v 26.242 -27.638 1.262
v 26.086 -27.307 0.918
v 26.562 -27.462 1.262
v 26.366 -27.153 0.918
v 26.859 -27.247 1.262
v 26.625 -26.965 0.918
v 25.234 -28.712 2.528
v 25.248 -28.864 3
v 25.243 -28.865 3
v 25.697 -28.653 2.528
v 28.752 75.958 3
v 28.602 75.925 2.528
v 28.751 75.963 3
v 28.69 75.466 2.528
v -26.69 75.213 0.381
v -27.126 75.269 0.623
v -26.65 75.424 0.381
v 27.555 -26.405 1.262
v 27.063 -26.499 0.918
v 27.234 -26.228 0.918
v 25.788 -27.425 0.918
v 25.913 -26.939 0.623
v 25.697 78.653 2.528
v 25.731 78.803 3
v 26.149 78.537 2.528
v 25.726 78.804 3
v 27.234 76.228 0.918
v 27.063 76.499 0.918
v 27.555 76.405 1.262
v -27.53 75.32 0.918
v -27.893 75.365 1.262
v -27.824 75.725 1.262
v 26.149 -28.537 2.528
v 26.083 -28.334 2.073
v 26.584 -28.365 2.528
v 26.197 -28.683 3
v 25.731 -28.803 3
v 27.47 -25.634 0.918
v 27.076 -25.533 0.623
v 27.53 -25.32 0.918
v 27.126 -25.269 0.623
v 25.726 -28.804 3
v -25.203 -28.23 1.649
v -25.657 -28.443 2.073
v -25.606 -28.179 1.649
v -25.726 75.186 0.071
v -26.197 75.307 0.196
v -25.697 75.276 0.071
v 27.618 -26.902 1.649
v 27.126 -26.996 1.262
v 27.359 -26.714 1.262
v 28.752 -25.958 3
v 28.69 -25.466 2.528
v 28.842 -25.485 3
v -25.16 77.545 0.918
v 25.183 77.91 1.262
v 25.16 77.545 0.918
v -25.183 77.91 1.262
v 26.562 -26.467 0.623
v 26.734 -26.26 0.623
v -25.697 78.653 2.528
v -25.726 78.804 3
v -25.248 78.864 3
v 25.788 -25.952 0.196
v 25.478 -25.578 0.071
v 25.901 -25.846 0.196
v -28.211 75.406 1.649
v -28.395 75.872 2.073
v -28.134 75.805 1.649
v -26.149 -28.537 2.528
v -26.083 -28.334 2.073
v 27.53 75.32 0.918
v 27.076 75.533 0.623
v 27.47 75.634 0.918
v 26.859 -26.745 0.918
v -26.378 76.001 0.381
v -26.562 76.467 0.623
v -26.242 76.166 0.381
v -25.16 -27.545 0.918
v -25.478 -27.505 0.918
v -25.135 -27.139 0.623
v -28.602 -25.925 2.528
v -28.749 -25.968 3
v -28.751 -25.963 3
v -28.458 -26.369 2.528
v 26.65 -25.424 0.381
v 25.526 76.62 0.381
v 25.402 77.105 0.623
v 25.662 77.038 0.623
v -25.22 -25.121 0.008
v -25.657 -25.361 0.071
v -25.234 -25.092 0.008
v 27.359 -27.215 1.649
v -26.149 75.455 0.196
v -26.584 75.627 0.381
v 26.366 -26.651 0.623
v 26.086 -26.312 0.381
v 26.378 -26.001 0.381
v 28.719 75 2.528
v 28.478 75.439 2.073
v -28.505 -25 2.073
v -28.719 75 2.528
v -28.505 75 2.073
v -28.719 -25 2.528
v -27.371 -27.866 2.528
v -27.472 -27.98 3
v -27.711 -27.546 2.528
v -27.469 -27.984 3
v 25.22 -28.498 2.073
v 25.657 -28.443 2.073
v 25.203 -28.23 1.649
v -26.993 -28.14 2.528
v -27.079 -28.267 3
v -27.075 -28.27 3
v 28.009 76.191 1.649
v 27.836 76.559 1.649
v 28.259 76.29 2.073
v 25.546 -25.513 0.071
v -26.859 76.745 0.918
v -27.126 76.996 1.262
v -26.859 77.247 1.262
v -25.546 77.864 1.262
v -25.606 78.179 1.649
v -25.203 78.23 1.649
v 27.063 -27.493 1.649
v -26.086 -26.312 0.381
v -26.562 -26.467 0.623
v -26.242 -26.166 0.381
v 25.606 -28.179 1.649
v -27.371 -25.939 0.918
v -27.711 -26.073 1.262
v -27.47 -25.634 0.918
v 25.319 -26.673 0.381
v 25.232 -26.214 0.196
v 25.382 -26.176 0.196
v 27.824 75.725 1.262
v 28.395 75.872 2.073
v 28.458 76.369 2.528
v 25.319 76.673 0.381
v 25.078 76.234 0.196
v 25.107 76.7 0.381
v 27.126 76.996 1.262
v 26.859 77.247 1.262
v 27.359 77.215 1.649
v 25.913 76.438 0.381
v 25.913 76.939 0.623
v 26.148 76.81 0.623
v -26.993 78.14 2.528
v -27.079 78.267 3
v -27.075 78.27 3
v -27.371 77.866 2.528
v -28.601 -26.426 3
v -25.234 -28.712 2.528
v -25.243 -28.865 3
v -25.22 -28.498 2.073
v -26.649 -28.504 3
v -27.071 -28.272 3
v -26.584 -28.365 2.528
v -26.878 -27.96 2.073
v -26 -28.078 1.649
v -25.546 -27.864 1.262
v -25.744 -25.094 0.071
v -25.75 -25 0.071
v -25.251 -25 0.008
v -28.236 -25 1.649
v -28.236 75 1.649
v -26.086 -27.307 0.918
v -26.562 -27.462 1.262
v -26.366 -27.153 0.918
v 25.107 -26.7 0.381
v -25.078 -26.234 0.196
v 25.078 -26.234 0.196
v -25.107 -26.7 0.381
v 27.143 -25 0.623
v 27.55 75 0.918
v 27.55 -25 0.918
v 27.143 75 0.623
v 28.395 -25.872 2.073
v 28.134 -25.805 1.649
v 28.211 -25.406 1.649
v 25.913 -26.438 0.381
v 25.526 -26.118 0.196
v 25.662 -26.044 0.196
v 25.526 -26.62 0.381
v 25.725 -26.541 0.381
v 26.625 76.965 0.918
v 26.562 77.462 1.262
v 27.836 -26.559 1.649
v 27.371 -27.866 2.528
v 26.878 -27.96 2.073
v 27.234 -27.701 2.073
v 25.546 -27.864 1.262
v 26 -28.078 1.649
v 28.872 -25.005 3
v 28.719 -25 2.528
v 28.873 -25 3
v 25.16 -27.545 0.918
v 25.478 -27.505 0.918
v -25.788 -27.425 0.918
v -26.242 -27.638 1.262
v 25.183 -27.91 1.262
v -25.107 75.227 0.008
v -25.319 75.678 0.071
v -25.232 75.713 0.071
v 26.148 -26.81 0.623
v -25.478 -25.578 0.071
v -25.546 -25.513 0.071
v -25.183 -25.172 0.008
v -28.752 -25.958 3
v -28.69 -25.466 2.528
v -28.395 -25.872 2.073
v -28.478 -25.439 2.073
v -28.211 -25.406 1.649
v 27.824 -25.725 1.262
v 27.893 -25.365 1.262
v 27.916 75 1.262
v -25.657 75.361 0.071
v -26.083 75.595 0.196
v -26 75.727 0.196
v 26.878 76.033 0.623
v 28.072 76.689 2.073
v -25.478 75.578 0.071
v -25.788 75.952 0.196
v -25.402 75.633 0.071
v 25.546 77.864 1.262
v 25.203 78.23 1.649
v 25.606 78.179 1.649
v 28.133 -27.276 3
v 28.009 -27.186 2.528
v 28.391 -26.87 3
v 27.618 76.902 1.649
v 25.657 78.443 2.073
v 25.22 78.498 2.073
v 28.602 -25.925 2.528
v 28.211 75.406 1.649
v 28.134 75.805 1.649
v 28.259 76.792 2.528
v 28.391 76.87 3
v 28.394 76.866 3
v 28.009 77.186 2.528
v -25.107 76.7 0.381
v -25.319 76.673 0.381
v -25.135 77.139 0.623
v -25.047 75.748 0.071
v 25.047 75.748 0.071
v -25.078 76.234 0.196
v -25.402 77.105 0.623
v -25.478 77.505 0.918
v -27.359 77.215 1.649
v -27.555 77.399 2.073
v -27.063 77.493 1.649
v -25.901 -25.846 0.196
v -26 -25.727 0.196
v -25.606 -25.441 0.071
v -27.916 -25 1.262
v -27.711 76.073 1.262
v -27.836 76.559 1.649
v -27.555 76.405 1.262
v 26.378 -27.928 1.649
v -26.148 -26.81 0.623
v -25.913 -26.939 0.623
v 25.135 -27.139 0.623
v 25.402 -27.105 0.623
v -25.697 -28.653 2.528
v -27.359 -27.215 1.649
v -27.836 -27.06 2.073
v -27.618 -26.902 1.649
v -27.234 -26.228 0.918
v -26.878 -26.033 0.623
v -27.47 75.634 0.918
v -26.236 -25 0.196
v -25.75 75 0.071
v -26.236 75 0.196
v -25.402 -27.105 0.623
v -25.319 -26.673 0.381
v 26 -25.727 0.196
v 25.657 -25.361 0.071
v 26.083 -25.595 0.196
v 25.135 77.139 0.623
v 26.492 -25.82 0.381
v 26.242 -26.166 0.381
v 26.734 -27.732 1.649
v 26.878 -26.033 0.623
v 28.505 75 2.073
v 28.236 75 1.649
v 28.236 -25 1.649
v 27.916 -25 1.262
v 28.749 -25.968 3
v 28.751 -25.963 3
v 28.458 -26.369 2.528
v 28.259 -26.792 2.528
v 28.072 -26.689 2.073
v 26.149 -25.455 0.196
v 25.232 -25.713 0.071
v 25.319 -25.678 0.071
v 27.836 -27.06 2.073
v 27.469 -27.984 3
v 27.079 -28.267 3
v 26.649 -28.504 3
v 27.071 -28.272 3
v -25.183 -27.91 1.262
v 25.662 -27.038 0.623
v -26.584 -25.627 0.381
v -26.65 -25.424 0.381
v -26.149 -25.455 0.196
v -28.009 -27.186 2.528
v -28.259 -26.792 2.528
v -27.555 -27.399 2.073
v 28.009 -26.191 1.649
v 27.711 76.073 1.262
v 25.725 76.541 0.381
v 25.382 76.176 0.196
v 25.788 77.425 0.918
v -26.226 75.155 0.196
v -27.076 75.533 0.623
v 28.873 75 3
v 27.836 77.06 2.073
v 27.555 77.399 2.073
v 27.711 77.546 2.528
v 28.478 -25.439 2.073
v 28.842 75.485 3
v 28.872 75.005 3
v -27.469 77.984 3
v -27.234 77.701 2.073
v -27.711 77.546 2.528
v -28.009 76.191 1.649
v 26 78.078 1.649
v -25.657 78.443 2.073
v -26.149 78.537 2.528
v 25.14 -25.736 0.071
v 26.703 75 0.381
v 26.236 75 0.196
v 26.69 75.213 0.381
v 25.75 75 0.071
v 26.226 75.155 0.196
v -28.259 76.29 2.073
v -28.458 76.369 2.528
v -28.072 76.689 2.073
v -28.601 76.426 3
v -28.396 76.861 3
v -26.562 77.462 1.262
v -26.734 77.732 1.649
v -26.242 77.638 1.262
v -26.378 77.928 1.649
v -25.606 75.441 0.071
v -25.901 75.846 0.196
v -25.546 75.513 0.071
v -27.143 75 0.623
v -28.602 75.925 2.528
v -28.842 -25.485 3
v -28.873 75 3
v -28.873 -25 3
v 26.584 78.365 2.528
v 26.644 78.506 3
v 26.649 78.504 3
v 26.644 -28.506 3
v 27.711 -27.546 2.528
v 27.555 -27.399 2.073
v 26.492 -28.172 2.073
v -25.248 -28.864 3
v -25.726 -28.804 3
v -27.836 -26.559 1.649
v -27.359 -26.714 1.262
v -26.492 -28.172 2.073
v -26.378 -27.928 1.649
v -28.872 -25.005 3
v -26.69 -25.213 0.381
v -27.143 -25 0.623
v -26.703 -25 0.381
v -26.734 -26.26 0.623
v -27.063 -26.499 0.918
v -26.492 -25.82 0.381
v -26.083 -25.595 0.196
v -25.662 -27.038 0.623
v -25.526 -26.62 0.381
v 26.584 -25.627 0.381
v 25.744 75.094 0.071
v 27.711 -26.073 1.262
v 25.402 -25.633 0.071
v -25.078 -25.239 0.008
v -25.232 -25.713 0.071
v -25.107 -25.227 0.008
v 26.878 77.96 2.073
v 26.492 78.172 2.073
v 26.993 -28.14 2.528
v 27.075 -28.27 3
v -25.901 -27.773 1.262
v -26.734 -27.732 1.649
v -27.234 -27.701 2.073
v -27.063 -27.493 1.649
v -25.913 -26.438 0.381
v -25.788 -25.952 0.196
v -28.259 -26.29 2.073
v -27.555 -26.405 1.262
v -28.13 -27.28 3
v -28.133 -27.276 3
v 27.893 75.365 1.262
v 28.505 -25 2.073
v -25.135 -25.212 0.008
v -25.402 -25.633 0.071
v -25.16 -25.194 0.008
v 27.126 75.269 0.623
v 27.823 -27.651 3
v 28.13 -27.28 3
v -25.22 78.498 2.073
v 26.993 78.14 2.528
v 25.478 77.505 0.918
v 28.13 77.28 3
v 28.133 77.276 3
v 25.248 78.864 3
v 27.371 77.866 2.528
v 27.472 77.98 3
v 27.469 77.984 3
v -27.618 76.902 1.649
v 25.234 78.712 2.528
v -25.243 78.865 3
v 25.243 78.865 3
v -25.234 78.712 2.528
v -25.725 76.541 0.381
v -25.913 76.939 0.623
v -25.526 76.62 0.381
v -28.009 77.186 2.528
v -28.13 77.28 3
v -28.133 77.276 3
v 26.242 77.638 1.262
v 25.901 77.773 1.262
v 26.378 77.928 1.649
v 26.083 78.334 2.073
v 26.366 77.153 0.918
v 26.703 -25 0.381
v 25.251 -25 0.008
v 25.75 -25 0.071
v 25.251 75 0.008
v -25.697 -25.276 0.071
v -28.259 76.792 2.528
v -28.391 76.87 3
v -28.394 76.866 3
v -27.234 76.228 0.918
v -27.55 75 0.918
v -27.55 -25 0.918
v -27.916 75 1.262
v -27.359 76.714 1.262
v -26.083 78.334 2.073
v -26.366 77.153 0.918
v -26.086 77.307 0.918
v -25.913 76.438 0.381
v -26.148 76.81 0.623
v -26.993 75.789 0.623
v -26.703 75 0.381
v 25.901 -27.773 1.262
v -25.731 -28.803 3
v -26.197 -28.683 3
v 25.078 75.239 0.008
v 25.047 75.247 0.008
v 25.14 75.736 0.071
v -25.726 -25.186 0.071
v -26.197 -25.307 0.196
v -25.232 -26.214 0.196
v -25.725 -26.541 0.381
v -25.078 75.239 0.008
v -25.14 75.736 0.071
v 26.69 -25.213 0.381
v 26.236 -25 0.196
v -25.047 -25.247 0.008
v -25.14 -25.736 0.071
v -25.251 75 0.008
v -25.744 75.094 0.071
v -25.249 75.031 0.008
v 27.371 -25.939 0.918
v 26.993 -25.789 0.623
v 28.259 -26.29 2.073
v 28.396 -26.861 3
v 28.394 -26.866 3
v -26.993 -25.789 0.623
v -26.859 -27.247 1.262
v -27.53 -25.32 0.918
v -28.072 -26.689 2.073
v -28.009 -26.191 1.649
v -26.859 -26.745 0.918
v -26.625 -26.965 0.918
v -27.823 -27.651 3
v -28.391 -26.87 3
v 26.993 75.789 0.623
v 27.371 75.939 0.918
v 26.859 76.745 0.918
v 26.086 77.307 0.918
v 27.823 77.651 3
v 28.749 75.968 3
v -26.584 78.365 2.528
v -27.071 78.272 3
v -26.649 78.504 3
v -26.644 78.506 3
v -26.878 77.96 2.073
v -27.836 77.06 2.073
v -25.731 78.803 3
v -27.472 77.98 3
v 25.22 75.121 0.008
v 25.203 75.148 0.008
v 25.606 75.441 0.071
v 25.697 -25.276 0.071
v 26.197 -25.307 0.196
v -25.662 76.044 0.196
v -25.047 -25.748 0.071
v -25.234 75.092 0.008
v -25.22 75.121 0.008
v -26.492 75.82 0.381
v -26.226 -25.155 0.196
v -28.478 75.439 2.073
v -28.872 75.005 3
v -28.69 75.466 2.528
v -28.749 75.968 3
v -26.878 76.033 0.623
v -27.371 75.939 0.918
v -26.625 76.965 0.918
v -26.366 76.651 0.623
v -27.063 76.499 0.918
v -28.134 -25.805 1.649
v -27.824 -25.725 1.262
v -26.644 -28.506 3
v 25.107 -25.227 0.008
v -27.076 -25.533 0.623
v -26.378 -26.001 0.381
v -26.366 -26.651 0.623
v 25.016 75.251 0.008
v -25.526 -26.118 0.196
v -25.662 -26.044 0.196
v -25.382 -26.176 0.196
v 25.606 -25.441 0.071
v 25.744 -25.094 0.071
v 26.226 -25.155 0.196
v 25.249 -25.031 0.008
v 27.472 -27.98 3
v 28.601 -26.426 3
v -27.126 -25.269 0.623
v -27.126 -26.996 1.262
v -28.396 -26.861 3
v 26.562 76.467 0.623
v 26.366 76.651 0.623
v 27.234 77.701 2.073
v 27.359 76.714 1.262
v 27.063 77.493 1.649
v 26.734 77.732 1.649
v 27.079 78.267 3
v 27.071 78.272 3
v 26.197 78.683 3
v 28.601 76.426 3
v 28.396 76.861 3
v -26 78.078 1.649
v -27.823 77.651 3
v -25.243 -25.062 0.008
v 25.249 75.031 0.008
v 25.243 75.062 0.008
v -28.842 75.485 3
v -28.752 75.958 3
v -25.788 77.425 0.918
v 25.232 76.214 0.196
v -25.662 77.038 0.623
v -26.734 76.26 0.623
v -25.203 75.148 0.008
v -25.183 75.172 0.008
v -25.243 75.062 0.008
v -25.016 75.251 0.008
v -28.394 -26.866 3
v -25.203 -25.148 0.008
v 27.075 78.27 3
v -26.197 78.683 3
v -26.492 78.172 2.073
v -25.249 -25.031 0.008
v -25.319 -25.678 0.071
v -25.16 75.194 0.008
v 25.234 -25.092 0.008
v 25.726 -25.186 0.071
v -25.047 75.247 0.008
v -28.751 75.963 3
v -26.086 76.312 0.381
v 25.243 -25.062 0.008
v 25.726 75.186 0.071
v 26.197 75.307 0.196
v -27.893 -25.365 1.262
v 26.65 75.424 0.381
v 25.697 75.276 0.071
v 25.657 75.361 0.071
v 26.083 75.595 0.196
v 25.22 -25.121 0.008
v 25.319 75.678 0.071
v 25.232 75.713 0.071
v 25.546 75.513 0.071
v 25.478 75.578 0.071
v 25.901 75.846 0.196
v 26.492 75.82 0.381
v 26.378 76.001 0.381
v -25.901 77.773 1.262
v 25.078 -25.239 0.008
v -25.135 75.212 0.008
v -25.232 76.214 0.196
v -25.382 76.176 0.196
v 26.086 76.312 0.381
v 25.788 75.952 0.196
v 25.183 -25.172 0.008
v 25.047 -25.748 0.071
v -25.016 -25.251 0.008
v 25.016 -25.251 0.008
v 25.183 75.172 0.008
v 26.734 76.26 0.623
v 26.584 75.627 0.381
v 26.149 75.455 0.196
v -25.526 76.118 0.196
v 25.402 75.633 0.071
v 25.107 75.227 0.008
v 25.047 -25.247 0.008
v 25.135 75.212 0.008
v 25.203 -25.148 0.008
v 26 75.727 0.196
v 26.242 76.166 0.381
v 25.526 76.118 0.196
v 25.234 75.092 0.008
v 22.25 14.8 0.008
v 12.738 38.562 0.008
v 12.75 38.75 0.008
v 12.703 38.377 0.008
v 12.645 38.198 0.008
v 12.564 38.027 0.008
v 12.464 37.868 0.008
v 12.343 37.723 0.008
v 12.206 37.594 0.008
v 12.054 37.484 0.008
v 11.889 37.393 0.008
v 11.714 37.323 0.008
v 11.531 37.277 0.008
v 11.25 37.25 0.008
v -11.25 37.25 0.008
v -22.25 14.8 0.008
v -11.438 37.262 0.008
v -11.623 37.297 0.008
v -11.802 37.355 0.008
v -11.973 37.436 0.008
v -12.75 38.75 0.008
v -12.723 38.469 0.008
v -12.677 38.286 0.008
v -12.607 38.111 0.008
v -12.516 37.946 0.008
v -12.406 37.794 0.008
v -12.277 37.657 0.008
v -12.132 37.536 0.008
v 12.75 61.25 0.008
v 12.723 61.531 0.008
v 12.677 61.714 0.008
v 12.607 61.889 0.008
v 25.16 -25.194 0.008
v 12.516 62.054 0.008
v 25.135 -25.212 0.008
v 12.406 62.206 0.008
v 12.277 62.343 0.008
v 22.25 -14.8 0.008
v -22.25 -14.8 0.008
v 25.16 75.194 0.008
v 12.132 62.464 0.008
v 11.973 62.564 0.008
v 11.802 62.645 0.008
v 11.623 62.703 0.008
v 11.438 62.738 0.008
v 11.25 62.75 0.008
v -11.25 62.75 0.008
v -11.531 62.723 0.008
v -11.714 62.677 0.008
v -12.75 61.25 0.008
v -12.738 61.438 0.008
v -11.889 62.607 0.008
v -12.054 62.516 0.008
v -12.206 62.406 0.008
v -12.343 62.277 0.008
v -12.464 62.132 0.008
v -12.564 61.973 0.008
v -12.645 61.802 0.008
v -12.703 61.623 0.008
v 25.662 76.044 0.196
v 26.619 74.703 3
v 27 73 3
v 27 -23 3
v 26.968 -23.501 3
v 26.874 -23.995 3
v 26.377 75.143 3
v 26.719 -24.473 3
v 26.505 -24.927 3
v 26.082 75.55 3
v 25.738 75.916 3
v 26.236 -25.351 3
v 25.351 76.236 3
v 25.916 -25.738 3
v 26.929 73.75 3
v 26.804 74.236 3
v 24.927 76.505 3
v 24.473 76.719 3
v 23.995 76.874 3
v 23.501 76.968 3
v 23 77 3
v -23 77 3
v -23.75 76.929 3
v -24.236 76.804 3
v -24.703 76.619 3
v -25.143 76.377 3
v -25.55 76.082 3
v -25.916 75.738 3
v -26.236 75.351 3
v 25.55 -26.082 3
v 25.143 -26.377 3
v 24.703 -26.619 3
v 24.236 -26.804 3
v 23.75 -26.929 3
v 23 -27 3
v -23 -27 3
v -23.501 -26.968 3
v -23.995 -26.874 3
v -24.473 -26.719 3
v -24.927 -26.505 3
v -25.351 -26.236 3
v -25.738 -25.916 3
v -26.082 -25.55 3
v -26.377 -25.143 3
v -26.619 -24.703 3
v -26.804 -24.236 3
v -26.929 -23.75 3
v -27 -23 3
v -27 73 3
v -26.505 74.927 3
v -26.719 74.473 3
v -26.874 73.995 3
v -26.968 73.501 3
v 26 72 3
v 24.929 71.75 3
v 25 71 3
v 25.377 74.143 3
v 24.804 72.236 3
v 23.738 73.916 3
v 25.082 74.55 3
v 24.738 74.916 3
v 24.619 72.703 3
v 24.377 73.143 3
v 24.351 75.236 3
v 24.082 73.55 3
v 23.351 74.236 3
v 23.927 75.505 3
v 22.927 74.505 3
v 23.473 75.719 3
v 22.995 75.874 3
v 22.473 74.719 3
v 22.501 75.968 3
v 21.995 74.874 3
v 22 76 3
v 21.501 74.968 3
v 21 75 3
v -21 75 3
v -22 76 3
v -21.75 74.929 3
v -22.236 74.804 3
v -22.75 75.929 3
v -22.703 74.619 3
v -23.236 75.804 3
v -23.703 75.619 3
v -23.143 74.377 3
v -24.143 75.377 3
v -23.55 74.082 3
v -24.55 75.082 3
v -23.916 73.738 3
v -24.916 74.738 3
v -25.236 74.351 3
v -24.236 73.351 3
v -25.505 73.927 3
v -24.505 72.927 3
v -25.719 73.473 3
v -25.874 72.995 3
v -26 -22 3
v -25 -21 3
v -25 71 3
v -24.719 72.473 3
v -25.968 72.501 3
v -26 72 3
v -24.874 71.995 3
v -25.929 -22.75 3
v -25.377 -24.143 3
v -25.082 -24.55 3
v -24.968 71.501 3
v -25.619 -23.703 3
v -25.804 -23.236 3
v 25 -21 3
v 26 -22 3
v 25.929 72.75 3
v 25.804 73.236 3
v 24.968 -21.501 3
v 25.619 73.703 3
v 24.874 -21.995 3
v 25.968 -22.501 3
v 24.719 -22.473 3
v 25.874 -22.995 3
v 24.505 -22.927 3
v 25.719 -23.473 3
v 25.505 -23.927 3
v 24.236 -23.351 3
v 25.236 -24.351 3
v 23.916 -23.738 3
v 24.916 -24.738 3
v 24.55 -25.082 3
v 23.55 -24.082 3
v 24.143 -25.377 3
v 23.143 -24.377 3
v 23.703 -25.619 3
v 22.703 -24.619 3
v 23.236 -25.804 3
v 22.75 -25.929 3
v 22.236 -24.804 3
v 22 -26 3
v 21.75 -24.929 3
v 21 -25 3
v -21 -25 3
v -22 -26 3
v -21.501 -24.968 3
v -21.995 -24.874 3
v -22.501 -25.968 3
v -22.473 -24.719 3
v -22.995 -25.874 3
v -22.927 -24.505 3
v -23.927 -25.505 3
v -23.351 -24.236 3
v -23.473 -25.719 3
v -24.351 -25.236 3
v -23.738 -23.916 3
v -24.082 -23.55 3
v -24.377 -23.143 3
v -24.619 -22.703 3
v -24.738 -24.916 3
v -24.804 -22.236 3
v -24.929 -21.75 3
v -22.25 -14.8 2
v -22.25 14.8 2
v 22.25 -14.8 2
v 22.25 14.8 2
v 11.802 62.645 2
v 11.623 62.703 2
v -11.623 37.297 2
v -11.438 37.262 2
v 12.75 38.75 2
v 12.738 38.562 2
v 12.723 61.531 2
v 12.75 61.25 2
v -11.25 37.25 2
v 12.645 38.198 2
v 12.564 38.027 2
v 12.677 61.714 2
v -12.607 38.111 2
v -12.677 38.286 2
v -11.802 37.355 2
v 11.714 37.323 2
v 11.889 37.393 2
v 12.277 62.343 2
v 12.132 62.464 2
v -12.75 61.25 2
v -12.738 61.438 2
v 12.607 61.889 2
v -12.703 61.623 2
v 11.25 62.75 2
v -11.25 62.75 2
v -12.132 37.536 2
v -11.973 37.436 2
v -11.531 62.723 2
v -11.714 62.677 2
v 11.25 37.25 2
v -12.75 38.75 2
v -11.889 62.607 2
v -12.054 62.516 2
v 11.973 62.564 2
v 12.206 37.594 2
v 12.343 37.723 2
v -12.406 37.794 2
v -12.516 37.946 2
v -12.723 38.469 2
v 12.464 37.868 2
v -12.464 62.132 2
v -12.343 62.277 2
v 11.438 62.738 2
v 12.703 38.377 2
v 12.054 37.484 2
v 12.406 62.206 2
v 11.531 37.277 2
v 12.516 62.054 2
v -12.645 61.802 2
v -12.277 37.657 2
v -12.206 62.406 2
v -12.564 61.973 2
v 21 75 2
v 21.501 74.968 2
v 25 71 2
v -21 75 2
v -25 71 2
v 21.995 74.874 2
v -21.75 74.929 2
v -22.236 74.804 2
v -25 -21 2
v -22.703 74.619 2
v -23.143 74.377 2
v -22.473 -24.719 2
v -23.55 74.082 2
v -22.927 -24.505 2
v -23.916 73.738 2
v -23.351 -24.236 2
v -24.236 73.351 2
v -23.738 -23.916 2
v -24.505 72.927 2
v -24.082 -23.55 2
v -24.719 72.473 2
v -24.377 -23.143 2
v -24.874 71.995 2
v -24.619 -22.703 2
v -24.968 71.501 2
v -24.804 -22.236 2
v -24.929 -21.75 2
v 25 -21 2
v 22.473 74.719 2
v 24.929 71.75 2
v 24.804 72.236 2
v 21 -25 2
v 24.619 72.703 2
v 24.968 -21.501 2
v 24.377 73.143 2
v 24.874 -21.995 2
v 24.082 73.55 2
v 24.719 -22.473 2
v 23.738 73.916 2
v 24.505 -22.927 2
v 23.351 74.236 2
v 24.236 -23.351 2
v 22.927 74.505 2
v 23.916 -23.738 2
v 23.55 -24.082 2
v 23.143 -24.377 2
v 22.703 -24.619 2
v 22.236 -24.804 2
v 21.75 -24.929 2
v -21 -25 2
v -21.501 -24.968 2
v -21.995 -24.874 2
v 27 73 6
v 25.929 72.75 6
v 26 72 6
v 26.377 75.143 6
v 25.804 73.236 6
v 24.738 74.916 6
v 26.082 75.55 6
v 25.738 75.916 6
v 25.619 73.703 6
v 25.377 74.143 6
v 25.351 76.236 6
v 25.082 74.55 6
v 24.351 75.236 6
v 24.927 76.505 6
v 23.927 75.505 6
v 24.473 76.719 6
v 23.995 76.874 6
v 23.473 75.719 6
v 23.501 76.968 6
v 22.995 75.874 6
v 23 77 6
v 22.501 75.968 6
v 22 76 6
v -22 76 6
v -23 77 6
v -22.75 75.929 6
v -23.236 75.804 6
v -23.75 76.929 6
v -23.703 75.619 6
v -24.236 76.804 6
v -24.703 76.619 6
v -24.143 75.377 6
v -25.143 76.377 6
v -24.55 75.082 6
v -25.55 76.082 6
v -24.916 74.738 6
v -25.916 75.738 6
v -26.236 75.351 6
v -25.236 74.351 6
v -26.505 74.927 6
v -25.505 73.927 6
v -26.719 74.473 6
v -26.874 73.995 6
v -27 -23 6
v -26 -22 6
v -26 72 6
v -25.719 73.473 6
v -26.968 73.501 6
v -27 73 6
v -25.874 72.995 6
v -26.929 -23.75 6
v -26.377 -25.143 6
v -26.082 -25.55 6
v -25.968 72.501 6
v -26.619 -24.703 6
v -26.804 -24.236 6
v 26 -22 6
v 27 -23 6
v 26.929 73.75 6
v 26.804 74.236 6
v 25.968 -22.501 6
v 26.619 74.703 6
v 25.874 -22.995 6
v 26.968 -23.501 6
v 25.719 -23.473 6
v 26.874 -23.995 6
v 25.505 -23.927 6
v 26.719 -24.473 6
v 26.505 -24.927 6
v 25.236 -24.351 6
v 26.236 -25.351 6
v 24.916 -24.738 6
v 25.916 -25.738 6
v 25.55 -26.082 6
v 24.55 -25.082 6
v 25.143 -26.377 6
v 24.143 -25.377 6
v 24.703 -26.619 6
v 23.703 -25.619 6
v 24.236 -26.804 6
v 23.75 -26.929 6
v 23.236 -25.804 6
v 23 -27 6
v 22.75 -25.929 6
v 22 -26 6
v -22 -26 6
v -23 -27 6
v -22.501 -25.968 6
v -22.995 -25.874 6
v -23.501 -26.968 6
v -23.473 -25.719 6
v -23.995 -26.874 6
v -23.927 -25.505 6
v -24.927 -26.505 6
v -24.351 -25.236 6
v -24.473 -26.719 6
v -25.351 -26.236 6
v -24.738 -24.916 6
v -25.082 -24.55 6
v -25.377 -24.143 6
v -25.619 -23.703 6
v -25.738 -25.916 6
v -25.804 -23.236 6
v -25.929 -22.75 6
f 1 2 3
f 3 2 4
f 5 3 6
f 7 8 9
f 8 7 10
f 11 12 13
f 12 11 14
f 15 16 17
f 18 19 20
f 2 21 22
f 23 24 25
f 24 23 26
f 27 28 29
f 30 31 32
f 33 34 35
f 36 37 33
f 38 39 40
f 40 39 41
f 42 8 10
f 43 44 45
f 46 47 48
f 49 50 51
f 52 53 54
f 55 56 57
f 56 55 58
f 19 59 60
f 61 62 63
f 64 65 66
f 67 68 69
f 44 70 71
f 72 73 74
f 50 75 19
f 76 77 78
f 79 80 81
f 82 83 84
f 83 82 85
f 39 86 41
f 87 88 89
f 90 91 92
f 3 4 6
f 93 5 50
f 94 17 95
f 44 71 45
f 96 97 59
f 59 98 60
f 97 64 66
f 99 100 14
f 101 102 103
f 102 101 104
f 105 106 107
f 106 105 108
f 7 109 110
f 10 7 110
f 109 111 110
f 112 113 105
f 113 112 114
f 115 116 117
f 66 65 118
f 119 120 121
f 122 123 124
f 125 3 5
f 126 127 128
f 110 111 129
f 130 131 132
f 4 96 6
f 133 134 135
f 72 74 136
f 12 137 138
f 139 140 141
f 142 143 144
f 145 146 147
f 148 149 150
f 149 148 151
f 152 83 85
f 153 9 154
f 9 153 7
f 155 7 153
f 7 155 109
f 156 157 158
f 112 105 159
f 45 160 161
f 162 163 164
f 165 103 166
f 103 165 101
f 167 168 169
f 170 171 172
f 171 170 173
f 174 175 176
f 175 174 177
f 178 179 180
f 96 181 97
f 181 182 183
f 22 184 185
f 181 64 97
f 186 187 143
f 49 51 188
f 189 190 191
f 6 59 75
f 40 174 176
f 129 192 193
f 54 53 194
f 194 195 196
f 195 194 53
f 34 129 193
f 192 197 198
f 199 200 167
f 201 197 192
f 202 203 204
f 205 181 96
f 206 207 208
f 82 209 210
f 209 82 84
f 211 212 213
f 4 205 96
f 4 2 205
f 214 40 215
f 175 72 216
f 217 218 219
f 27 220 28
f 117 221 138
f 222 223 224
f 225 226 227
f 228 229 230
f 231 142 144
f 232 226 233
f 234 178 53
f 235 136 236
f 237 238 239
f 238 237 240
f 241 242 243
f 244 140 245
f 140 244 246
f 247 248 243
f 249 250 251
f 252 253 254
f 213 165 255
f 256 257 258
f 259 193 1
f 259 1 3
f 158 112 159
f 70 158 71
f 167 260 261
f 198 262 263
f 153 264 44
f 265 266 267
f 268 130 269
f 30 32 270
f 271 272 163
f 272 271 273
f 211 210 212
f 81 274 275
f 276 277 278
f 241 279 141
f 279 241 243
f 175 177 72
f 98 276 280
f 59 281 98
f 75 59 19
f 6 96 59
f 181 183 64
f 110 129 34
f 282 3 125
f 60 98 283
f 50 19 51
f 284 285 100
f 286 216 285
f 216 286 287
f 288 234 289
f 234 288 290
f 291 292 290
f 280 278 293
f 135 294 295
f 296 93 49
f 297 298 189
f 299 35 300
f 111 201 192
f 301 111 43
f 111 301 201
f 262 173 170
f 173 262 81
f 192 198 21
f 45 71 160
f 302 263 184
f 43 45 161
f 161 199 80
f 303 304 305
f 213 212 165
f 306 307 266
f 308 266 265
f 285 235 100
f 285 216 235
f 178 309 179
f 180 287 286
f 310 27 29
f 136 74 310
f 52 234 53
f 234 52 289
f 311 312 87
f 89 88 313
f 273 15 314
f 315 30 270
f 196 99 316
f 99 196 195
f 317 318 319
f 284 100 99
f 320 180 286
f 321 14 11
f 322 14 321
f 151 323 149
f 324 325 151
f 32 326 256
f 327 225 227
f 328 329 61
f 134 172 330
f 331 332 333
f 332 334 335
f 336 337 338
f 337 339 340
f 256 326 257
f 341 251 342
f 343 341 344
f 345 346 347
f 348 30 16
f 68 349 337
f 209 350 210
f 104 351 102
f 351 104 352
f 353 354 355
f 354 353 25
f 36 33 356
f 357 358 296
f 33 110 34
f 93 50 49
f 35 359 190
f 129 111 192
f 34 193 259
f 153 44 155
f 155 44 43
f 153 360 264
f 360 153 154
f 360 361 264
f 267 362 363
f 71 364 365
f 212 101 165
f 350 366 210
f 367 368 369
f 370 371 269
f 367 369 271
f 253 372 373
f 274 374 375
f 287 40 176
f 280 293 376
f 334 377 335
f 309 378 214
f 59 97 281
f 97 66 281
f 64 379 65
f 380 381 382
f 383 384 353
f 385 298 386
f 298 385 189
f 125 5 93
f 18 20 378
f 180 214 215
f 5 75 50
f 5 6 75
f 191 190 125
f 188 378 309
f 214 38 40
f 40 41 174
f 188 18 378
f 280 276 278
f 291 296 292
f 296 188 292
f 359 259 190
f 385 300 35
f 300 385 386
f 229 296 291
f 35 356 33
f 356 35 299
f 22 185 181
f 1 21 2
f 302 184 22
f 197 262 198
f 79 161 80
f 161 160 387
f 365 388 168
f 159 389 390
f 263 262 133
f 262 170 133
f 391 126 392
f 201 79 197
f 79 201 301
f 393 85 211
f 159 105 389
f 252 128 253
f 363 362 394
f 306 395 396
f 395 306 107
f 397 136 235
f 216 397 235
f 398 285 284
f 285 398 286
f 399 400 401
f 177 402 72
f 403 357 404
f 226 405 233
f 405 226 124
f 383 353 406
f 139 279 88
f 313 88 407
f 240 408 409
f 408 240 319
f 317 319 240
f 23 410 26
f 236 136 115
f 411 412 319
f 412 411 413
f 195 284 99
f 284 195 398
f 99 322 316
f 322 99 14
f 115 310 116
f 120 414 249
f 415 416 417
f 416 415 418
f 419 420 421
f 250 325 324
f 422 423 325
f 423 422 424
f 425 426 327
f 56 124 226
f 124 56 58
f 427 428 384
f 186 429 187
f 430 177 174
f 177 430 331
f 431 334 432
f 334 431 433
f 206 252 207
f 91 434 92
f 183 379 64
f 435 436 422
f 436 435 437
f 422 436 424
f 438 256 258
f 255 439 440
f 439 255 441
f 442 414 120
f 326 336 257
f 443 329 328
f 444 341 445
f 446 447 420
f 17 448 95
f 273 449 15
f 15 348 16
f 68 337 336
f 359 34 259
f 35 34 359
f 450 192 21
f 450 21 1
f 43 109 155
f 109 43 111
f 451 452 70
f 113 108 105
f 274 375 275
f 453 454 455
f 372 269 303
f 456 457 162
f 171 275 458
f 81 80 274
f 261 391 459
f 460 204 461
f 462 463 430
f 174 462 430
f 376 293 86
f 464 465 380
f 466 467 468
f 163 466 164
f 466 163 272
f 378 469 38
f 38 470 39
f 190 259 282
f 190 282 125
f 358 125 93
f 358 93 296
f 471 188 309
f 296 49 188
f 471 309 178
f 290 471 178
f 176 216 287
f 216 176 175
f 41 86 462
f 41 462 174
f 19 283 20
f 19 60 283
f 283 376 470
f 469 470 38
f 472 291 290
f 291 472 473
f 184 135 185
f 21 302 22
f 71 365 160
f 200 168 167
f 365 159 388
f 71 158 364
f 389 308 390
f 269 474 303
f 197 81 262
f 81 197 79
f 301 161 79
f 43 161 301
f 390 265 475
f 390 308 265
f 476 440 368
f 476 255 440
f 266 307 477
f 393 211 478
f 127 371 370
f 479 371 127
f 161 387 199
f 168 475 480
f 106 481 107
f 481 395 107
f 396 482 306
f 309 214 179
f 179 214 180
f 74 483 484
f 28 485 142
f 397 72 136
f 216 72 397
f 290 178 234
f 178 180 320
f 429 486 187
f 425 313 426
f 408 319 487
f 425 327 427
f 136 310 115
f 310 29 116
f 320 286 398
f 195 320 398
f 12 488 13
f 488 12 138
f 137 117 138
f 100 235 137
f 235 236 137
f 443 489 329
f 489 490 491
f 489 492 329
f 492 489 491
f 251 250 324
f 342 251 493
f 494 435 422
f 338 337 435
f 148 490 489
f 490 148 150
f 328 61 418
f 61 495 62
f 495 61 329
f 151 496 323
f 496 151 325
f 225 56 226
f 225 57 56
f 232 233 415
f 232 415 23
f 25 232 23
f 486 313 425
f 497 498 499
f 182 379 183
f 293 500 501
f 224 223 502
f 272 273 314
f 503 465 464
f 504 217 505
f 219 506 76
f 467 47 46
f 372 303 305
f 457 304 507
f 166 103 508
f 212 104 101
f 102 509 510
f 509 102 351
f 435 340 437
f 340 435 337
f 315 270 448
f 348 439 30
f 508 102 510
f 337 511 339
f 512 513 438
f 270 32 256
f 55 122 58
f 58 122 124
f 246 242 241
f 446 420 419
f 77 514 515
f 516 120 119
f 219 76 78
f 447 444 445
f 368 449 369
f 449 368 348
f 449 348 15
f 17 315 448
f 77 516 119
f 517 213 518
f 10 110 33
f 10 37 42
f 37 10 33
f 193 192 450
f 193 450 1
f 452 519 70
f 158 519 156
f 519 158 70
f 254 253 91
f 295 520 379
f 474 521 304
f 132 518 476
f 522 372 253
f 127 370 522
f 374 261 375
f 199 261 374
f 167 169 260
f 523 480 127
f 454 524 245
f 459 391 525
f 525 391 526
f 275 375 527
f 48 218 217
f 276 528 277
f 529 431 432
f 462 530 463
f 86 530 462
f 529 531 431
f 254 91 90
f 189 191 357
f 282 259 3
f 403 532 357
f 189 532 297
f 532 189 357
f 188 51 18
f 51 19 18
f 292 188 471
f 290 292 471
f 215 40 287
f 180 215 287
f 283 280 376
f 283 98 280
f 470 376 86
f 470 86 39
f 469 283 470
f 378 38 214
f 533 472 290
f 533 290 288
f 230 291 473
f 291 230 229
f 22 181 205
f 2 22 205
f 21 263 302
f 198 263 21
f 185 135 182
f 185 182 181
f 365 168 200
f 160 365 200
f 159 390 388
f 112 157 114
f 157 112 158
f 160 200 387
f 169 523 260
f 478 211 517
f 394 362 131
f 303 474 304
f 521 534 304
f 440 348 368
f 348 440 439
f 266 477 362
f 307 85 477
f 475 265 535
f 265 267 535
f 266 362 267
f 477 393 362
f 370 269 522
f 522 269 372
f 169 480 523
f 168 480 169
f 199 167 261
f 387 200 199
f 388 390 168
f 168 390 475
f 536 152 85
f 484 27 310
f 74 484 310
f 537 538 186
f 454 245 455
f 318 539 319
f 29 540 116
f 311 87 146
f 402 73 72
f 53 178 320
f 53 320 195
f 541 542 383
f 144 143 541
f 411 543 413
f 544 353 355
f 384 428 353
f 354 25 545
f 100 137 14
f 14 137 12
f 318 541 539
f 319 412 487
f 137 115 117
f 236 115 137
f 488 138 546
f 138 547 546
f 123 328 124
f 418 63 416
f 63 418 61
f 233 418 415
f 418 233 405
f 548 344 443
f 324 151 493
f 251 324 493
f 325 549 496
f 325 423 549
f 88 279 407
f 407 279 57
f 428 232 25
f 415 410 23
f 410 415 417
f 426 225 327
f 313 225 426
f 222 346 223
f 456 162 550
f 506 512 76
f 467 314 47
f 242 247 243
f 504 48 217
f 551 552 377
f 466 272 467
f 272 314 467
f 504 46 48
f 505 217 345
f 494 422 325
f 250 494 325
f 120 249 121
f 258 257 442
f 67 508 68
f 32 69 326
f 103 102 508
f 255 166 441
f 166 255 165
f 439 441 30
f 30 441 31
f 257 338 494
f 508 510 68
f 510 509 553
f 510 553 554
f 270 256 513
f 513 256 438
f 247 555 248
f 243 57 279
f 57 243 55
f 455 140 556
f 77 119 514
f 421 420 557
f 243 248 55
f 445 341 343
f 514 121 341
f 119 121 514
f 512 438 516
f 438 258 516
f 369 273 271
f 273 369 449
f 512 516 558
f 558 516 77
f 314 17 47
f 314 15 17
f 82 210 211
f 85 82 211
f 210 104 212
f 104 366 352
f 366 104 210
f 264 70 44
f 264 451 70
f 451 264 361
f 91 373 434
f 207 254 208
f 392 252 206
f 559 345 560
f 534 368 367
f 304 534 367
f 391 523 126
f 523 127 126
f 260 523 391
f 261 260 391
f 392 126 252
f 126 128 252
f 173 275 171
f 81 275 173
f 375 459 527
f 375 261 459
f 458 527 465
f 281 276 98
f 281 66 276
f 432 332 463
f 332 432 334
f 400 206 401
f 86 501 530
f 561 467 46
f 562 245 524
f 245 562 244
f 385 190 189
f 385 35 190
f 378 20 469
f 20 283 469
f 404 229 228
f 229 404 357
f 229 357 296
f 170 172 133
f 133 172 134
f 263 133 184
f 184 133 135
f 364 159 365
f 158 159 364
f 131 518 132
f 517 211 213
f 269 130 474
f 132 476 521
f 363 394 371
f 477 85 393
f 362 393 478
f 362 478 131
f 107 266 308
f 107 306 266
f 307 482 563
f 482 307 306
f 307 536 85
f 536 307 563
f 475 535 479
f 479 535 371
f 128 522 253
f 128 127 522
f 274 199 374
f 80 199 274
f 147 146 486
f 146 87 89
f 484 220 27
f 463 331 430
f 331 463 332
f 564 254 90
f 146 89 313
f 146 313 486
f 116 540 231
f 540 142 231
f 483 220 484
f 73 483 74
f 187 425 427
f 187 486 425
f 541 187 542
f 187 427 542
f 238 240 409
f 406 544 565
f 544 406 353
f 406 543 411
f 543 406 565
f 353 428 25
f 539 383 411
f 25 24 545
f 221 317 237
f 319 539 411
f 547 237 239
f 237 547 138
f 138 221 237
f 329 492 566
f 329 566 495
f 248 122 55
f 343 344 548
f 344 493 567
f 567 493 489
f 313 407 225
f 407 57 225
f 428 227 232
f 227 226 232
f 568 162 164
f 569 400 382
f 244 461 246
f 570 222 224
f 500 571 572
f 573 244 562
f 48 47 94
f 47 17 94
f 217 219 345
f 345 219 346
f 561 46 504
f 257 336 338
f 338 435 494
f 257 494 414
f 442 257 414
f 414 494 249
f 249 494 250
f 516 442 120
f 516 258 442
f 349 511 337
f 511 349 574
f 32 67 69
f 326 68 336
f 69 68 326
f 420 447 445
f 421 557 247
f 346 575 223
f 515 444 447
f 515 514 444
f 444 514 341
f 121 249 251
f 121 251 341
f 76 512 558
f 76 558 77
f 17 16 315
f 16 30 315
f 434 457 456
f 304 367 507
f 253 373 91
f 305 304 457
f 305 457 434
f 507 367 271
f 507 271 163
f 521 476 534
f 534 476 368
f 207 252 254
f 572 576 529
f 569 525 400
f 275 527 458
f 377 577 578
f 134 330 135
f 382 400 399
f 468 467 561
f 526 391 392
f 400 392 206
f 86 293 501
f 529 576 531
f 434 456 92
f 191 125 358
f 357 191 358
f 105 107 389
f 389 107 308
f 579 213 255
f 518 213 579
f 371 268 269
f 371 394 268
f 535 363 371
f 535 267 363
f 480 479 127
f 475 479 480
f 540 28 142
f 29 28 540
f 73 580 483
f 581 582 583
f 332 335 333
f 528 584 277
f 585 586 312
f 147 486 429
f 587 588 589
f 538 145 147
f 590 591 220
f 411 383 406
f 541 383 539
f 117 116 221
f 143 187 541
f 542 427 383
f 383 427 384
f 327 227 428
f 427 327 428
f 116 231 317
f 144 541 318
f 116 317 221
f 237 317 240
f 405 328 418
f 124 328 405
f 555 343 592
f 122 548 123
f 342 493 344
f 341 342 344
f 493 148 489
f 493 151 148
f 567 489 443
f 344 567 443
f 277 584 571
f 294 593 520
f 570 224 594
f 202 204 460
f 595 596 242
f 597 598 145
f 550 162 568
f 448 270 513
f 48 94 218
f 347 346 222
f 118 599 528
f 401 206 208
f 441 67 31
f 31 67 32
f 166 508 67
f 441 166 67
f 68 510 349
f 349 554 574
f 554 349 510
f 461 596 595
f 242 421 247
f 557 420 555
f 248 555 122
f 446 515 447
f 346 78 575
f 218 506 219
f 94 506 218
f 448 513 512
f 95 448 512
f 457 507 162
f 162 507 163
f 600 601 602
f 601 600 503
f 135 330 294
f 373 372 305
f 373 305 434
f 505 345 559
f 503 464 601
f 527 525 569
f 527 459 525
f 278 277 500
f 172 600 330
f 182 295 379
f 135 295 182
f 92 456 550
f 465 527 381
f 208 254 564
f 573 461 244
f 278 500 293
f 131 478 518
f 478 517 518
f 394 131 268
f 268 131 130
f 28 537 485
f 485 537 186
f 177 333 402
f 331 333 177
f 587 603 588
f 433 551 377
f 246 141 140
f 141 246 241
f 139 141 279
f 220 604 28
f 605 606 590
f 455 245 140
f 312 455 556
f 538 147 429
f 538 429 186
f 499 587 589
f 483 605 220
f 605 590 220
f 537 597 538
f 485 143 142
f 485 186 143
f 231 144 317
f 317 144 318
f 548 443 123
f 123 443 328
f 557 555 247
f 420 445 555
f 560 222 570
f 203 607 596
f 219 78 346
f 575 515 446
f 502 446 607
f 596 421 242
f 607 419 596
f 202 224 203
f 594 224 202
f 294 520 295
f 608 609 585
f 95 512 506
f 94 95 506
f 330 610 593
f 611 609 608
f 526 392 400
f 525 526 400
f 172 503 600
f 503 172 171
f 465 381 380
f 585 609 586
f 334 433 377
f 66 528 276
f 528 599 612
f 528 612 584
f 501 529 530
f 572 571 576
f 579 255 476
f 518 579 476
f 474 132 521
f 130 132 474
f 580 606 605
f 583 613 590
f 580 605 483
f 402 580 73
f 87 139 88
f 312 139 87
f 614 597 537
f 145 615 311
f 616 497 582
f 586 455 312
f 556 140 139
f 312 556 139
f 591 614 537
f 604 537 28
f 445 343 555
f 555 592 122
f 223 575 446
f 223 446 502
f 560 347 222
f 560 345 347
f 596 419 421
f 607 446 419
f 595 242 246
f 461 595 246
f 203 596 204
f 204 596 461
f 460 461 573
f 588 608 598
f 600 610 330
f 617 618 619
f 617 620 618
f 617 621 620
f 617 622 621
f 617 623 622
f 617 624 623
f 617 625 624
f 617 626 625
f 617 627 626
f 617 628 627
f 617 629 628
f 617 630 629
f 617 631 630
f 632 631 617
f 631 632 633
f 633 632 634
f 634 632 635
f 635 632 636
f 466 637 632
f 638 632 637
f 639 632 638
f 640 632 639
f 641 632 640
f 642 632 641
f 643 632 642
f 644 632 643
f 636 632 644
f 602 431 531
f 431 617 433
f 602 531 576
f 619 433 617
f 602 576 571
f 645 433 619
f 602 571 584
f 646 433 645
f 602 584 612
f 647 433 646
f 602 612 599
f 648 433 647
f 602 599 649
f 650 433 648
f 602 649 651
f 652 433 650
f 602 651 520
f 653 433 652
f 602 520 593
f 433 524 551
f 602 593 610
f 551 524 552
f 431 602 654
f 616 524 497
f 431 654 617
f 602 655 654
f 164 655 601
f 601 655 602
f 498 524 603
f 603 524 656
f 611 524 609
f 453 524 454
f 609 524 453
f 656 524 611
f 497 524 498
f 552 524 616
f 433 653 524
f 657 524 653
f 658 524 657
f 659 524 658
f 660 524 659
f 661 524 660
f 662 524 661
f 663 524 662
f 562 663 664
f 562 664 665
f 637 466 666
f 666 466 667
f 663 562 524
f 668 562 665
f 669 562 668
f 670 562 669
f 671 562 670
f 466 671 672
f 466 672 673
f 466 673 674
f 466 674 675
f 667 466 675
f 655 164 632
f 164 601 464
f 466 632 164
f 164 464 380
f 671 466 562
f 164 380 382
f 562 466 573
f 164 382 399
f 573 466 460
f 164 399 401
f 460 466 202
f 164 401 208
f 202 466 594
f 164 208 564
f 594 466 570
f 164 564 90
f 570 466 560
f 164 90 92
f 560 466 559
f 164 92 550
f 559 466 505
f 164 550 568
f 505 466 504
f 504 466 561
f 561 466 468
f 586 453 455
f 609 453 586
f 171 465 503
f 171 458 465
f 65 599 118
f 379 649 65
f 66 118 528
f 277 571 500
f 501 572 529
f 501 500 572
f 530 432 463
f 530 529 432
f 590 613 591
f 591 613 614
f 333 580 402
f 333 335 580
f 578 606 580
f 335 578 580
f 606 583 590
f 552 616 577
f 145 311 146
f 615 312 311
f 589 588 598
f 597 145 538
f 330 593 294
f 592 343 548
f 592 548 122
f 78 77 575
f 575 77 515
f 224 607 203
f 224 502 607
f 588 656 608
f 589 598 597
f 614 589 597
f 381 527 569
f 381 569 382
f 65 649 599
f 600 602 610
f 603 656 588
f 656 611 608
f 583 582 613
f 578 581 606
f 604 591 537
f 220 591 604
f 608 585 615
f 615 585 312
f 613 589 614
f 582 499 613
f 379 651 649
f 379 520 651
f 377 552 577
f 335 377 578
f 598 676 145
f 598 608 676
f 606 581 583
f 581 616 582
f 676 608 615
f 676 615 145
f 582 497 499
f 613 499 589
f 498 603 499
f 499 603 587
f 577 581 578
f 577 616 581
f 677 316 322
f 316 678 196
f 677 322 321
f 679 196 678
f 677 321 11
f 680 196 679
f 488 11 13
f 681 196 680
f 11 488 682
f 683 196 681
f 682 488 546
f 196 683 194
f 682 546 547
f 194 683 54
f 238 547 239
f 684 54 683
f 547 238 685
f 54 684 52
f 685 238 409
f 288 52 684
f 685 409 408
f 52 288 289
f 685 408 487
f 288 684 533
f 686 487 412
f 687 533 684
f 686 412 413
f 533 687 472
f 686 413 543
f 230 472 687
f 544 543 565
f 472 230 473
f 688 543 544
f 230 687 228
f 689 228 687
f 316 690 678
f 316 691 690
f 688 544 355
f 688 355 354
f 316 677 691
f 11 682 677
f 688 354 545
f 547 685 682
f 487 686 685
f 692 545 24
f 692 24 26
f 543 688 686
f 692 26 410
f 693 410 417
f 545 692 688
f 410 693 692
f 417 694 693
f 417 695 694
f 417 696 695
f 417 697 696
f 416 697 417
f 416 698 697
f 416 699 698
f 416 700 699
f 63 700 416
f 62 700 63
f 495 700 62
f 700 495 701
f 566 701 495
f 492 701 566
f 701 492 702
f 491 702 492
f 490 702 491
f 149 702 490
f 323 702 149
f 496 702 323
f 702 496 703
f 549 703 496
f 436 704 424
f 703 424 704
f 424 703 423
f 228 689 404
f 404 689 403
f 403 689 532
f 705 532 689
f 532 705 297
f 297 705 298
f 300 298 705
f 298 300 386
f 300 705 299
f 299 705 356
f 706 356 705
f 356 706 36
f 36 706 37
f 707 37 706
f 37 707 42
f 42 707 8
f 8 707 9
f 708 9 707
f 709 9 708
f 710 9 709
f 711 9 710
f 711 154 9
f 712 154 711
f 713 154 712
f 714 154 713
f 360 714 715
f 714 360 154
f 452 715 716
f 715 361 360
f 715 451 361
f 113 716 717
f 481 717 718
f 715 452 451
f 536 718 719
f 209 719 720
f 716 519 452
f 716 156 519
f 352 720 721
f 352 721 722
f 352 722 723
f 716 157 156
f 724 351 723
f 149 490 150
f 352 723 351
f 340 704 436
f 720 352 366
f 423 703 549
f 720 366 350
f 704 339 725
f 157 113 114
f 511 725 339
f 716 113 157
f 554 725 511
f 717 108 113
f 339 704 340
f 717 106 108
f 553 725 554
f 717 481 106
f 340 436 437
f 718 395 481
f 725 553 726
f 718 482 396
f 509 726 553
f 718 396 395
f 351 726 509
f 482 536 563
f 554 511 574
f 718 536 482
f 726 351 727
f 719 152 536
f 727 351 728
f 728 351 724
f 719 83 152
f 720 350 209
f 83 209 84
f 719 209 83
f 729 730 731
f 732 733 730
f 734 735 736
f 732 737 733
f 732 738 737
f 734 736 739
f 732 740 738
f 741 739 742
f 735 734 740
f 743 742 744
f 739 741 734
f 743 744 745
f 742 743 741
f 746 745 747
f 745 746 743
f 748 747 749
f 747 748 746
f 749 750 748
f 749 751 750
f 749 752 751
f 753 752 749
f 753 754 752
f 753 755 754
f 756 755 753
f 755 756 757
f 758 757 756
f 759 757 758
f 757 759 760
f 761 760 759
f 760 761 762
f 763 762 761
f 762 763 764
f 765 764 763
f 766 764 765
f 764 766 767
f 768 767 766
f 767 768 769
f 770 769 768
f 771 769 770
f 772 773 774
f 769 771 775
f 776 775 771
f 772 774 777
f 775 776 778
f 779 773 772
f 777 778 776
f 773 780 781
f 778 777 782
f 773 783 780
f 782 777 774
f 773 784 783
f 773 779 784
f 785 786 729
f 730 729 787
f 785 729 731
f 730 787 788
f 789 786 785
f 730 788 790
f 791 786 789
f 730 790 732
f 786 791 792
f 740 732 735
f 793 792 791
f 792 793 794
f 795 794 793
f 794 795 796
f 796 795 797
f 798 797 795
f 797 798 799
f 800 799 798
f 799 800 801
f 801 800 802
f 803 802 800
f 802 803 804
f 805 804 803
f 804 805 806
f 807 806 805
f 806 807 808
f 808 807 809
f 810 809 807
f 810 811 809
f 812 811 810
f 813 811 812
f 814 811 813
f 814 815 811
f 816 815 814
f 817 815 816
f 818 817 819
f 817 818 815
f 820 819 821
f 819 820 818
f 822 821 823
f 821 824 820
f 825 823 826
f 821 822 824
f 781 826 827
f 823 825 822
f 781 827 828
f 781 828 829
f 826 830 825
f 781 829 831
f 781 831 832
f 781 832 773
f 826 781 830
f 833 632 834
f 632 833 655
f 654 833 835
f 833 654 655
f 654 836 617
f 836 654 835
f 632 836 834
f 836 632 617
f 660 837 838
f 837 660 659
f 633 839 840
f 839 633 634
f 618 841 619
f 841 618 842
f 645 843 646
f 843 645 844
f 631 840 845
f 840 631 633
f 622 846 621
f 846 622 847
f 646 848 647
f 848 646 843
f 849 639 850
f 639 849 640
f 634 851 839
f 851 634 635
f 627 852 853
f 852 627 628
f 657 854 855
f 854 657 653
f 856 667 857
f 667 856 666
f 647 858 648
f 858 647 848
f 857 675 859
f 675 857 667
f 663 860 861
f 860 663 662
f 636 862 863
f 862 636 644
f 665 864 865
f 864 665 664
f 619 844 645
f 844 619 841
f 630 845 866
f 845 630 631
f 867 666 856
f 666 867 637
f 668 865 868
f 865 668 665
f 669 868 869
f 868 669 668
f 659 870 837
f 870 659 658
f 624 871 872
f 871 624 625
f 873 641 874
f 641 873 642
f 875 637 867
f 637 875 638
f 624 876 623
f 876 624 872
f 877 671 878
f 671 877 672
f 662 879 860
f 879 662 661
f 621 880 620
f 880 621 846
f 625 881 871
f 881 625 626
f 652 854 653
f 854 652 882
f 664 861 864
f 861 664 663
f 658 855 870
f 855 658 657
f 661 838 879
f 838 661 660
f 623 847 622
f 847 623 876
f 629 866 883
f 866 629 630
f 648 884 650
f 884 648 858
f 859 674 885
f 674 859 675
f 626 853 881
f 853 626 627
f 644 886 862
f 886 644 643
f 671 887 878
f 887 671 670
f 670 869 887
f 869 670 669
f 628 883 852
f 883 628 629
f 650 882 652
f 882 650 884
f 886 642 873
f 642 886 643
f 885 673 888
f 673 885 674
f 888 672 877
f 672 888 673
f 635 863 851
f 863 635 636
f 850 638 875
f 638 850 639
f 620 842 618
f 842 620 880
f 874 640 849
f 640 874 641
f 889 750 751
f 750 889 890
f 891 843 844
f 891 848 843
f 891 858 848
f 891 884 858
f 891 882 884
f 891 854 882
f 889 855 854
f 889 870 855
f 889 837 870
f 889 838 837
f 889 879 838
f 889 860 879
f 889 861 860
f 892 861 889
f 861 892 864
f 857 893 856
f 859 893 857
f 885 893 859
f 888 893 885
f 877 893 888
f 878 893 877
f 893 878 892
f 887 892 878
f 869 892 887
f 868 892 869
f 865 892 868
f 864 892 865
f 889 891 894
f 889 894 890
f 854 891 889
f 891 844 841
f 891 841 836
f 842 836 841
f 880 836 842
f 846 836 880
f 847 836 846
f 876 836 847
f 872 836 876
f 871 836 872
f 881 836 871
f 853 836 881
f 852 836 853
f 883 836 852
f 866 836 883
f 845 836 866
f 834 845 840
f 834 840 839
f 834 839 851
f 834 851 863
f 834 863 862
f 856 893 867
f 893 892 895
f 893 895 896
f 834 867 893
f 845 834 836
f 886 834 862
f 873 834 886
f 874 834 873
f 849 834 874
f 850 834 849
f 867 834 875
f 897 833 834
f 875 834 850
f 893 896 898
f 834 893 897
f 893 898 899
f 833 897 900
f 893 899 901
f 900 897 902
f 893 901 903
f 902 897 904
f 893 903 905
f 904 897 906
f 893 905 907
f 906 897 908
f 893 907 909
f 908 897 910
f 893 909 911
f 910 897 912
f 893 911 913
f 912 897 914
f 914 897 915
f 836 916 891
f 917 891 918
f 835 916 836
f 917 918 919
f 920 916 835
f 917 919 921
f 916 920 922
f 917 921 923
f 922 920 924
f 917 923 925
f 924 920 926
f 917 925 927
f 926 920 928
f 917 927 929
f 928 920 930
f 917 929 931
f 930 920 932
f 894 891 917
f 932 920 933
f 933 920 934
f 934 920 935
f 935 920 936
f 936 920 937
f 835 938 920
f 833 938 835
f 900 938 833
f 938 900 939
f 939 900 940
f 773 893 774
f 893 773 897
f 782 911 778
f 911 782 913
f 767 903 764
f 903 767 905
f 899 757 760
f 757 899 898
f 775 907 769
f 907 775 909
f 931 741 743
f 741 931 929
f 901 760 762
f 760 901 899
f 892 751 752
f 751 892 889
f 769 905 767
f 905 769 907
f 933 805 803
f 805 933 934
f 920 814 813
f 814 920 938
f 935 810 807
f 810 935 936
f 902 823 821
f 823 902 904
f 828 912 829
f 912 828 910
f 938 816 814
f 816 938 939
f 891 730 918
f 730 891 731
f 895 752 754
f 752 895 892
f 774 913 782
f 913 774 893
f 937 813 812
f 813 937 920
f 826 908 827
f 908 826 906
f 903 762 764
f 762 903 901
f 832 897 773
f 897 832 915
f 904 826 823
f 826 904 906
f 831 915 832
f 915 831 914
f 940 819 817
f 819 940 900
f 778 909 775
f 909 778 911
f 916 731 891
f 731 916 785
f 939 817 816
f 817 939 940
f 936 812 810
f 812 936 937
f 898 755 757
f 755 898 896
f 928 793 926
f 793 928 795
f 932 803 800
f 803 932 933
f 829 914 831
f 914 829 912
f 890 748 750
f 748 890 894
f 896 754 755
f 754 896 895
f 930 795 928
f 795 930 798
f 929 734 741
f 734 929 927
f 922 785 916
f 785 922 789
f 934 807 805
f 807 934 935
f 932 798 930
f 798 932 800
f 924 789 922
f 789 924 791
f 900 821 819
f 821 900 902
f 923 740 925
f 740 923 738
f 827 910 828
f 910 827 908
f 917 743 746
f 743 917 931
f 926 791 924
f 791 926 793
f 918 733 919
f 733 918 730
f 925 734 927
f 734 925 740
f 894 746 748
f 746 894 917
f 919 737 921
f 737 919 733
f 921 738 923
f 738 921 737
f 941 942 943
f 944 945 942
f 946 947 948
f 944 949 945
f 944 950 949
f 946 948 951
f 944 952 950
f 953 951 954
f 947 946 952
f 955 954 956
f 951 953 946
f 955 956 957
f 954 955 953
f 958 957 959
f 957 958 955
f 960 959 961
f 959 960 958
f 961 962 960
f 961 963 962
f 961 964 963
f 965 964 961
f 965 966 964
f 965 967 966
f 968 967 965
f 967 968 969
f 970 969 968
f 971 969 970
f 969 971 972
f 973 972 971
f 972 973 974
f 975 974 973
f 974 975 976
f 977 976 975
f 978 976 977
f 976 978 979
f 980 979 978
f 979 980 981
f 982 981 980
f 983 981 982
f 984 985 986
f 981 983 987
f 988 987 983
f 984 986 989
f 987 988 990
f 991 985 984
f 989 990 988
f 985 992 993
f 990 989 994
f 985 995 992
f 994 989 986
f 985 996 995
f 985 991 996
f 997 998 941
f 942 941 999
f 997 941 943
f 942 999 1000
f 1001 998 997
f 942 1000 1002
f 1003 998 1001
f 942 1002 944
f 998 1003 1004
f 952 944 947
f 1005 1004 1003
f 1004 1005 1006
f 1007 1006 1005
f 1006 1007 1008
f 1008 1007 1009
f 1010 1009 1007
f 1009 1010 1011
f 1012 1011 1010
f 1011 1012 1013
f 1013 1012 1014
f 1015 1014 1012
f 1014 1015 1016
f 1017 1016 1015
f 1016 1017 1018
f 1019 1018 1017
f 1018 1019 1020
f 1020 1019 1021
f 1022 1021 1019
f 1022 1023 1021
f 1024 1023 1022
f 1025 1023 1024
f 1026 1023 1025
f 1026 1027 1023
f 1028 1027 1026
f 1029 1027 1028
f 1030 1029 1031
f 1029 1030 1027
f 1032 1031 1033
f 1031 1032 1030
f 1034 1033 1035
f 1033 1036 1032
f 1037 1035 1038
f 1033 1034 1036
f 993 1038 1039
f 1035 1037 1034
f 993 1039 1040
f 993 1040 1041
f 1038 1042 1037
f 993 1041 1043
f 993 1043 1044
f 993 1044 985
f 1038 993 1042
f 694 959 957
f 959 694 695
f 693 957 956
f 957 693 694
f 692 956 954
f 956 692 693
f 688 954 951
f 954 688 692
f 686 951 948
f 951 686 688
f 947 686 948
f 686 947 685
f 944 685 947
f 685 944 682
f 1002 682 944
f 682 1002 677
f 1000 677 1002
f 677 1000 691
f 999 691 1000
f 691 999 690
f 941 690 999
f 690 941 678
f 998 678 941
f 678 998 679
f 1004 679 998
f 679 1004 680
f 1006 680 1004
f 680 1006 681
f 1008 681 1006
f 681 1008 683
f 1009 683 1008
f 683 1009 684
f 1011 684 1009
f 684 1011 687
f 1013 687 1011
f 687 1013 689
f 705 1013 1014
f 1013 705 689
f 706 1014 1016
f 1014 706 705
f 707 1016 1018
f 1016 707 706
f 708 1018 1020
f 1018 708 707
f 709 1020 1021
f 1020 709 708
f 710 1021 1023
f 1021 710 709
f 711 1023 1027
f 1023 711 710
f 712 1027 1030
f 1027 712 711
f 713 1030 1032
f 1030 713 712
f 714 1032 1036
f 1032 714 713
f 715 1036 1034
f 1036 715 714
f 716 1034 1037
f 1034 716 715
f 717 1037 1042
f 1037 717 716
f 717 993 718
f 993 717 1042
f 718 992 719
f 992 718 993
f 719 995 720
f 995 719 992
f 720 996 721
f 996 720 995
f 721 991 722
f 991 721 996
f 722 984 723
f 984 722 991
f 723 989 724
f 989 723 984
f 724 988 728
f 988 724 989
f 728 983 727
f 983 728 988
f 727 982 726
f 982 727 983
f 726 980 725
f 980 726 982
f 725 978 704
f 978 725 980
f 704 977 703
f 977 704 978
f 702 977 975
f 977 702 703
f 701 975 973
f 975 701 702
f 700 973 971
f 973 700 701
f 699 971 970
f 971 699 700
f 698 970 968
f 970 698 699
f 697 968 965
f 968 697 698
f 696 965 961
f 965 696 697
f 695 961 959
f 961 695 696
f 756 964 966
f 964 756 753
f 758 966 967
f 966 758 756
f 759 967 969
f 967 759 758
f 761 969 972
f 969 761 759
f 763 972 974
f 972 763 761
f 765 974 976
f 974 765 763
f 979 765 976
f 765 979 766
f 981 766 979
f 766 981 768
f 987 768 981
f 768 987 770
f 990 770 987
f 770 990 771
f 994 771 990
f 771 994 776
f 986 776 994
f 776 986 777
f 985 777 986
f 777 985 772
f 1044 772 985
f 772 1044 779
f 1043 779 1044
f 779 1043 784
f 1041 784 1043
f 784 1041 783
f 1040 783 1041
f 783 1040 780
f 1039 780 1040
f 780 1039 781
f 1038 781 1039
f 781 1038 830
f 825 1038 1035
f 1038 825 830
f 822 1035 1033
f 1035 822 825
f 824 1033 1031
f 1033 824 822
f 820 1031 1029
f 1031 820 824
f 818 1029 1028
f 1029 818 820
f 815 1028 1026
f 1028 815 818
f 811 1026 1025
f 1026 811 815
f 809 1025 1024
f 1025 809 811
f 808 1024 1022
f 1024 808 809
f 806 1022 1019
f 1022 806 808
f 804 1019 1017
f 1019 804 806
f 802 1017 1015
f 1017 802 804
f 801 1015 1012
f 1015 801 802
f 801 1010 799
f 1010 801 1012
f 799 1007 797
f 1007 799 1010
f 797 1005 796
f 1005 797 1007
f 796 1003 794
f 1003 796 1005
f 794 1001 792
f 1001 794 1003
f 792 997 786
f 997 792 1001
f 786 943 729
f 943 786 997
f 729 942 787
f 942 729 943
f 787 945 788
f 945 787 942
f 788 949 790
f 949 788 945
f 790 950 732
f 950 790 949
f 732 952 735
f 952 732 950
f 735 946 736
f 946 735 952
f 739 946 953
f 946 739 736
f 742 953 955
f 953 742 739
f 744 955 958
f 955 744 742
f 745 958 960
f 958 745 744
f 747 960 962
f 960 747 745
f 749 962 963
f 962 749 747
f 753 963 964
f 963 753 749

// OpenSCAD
echo(version=version());

$fn=50;
screenWidth = 29.6;
screenLength = 44.5;
screenHoleOffsetX = 0.5;
screenHoleOffsetY = 2.0;
//screwHoleRadius = 1.0;

basethickness = 4;
boxLength = 100;
boxWidth = 50;
wallthickness = 4;

corners = [[boxWidth/2,boxLength/2,0],[-boxWidth/2,-boxLength/2,0],[boxWidth/2,-boxLength/2,0],[-boxWidth/2,boxLength/2,0]];

main();

module main(){
    translate([0,0,basethickness])
        rotate([180,0,0])
            union(){
                difference()  {
                    Base();
                    ScreenHole();
                    //ScrewHoles();
                    AerialHole();
                    Hollow();
                 };
                 Rim();
             }
}

module ScreenHole(){
    linear_extrude(height = basethickness+2)
        translate([0,0,-2])
            square([screenLength, screenWidth], center = true);
}

module AerialHole(){
    linear_extrude(height = basethickness+2)
        translate([0,-50,-2])
            offset(r=1.5)
                square([22.5, 22.5], center = true);
}

module ScrewHoles(){
    x = (screenLength/2)+screenHoleOffsetX;
    y = (screenWidth/2)+screenHoleOffsetY;
    ScrewHole(-x,-y);
    ScrewHole(x,-y);
    ScrewHole(-x,y);
    ScrewHole(x,y);
}
  
module ScrewHole(x,y){
     linear_extrude(height = basethickness+2)
        translate([x,y,-2])
            circle(screwHoleRadius,$fn=50);
}

module Base(){
    translate([0,-25,0])
        difference()  {
            hull(){
                for (a = corners)
                    translate([a[0],a[1],a[2]]) 
                        sphere(wallthickness);
            };
       translate([0,0,-wallthickness])
            cube([boxWidth+10, boxLength+10, 10], center = true);
    }
}

module BoxFootprint(x, y){
    offset(r=wallthickness)
        square([x, y], center = true);
}

module Rim(){
    translate([0,-25,-2])
        linear_extrude(height = 5, scale = 1)
            difference()  {
                BoxFootprint(boxWidth-4, boxLength-4);
                BoxFootprint(boxWidth-6, boxLength-6);
            }
}

module Hollow(){
    linear_extrude(height = 2, scale = 1)
        translate([0,-25,2])
            BoxFootprint(boxWidth-8, boxLength-8);
}
